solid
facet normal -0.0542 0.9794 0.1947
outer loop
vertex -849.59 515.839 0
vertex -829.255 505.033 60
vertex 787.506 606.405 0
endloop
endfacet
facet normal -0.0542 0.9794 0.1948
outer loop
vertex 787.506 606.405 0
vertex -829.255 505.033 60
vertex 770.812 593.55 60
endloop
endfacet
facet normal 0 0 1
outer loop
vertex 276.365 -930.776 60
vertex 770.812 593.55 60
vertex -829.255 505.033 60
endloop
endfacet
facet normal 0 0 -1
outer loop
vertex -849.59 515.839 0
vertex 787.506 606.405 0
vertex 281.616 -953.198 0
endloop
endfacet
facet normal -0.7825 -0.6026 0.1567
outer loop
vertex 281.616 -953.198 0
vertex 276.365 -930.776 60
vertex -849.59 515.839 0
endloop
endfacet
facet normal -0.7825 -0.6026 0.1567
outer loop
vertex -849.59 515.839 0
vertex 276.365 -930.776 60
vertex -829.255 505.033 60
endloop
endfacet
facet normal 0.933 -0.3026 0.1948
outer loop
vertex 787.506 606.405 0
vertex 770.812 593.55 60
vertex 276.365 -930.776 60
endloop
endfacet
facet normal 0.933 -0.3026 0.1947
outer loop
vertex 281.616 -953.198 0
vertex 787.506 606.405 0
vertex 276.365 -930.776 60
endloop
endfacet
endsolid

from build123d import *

# Parameters (mm, degrees)
EXTRUDE_1_DEPTH = 60
CHAMFER3_SIZE2  = 11.912970931
CHAMFER3_SIZE   = 60
CHAMFER4_SIZE2  = 11.912970931
CHAMFER4_SIZE   = 60
CHAMFER5_SIZE2  = 9.519169095
CHAMFER5_SIZE   = 60


with BuildPart() as part:
    # Эскиз1 → Бобышка-Вытянуть1 (new body)
    with BuildSketch(Plane.XY):
        Polygon((-849.589927609, 515.838957491), (787.506047005, 606.405063543), (281.615569427, -953.197537878), align=None)
    extrude(amount=EXTRUDE_1_DEPTH)

    # Chamfer3
    chamfer3_edges = [part.edges().sort_by_distance(p)[0] for p in [
        (-31.041940302, 561.122010517, 60),
    ]]
    chamfer3_side = [part.faces().sort_by_distance(p)[0] for p in [
        (-31.041940302, 561.122010517, 59.761740581),
    ]]
    chamfer(chamfer3_edges, length=CHAMFER3_SIZE - 0.0001, length2=CHAMFER3_SIZE2 - 0.0001, reference=chamfer3_side[0])  # a hair under: the kernel refuses the full size

    # Chamfer4
    chamfer4_edges = [part.edges().sort_by_distance(p)[0] for p in [
        (532.590398399, -179.470785737, 60),
    ]]
    chamfer4_side = [part.faces().sort_by_distance(p)[0] for p in [
        (532.590398399, -179.470785737, 59.761740581),
    ]]
    chamfer(chamfer4_edges, length=CHAMFER4_SIZE - 0.0001, length2=CHAMFER4_SIZE2 - 0.0001, reference=chamfer4_side[0])  # a hair under: the kernel refuses the full size

    # Chamfer5
    chamfer5_edges = [part.edges().sort_by_distance(p)[0] for p in [
        (-283.987179091, -218.679290193, 60),
    ]]
    chamfer5_side = [part.faces().sort_by_distance(p)[0] for p in [
        (-283.987179091, -218.679290193, 59.809616618),
    ]]
    chamfer(chamfer5_edges, length=CHAMFER5_SIZE - 0.0001, length2=CHAMFER5_SIZE2 - 0.0001, reference=chamfer5_side[0])  # a hair under: the kernel refuses the full size


solid = part.part
